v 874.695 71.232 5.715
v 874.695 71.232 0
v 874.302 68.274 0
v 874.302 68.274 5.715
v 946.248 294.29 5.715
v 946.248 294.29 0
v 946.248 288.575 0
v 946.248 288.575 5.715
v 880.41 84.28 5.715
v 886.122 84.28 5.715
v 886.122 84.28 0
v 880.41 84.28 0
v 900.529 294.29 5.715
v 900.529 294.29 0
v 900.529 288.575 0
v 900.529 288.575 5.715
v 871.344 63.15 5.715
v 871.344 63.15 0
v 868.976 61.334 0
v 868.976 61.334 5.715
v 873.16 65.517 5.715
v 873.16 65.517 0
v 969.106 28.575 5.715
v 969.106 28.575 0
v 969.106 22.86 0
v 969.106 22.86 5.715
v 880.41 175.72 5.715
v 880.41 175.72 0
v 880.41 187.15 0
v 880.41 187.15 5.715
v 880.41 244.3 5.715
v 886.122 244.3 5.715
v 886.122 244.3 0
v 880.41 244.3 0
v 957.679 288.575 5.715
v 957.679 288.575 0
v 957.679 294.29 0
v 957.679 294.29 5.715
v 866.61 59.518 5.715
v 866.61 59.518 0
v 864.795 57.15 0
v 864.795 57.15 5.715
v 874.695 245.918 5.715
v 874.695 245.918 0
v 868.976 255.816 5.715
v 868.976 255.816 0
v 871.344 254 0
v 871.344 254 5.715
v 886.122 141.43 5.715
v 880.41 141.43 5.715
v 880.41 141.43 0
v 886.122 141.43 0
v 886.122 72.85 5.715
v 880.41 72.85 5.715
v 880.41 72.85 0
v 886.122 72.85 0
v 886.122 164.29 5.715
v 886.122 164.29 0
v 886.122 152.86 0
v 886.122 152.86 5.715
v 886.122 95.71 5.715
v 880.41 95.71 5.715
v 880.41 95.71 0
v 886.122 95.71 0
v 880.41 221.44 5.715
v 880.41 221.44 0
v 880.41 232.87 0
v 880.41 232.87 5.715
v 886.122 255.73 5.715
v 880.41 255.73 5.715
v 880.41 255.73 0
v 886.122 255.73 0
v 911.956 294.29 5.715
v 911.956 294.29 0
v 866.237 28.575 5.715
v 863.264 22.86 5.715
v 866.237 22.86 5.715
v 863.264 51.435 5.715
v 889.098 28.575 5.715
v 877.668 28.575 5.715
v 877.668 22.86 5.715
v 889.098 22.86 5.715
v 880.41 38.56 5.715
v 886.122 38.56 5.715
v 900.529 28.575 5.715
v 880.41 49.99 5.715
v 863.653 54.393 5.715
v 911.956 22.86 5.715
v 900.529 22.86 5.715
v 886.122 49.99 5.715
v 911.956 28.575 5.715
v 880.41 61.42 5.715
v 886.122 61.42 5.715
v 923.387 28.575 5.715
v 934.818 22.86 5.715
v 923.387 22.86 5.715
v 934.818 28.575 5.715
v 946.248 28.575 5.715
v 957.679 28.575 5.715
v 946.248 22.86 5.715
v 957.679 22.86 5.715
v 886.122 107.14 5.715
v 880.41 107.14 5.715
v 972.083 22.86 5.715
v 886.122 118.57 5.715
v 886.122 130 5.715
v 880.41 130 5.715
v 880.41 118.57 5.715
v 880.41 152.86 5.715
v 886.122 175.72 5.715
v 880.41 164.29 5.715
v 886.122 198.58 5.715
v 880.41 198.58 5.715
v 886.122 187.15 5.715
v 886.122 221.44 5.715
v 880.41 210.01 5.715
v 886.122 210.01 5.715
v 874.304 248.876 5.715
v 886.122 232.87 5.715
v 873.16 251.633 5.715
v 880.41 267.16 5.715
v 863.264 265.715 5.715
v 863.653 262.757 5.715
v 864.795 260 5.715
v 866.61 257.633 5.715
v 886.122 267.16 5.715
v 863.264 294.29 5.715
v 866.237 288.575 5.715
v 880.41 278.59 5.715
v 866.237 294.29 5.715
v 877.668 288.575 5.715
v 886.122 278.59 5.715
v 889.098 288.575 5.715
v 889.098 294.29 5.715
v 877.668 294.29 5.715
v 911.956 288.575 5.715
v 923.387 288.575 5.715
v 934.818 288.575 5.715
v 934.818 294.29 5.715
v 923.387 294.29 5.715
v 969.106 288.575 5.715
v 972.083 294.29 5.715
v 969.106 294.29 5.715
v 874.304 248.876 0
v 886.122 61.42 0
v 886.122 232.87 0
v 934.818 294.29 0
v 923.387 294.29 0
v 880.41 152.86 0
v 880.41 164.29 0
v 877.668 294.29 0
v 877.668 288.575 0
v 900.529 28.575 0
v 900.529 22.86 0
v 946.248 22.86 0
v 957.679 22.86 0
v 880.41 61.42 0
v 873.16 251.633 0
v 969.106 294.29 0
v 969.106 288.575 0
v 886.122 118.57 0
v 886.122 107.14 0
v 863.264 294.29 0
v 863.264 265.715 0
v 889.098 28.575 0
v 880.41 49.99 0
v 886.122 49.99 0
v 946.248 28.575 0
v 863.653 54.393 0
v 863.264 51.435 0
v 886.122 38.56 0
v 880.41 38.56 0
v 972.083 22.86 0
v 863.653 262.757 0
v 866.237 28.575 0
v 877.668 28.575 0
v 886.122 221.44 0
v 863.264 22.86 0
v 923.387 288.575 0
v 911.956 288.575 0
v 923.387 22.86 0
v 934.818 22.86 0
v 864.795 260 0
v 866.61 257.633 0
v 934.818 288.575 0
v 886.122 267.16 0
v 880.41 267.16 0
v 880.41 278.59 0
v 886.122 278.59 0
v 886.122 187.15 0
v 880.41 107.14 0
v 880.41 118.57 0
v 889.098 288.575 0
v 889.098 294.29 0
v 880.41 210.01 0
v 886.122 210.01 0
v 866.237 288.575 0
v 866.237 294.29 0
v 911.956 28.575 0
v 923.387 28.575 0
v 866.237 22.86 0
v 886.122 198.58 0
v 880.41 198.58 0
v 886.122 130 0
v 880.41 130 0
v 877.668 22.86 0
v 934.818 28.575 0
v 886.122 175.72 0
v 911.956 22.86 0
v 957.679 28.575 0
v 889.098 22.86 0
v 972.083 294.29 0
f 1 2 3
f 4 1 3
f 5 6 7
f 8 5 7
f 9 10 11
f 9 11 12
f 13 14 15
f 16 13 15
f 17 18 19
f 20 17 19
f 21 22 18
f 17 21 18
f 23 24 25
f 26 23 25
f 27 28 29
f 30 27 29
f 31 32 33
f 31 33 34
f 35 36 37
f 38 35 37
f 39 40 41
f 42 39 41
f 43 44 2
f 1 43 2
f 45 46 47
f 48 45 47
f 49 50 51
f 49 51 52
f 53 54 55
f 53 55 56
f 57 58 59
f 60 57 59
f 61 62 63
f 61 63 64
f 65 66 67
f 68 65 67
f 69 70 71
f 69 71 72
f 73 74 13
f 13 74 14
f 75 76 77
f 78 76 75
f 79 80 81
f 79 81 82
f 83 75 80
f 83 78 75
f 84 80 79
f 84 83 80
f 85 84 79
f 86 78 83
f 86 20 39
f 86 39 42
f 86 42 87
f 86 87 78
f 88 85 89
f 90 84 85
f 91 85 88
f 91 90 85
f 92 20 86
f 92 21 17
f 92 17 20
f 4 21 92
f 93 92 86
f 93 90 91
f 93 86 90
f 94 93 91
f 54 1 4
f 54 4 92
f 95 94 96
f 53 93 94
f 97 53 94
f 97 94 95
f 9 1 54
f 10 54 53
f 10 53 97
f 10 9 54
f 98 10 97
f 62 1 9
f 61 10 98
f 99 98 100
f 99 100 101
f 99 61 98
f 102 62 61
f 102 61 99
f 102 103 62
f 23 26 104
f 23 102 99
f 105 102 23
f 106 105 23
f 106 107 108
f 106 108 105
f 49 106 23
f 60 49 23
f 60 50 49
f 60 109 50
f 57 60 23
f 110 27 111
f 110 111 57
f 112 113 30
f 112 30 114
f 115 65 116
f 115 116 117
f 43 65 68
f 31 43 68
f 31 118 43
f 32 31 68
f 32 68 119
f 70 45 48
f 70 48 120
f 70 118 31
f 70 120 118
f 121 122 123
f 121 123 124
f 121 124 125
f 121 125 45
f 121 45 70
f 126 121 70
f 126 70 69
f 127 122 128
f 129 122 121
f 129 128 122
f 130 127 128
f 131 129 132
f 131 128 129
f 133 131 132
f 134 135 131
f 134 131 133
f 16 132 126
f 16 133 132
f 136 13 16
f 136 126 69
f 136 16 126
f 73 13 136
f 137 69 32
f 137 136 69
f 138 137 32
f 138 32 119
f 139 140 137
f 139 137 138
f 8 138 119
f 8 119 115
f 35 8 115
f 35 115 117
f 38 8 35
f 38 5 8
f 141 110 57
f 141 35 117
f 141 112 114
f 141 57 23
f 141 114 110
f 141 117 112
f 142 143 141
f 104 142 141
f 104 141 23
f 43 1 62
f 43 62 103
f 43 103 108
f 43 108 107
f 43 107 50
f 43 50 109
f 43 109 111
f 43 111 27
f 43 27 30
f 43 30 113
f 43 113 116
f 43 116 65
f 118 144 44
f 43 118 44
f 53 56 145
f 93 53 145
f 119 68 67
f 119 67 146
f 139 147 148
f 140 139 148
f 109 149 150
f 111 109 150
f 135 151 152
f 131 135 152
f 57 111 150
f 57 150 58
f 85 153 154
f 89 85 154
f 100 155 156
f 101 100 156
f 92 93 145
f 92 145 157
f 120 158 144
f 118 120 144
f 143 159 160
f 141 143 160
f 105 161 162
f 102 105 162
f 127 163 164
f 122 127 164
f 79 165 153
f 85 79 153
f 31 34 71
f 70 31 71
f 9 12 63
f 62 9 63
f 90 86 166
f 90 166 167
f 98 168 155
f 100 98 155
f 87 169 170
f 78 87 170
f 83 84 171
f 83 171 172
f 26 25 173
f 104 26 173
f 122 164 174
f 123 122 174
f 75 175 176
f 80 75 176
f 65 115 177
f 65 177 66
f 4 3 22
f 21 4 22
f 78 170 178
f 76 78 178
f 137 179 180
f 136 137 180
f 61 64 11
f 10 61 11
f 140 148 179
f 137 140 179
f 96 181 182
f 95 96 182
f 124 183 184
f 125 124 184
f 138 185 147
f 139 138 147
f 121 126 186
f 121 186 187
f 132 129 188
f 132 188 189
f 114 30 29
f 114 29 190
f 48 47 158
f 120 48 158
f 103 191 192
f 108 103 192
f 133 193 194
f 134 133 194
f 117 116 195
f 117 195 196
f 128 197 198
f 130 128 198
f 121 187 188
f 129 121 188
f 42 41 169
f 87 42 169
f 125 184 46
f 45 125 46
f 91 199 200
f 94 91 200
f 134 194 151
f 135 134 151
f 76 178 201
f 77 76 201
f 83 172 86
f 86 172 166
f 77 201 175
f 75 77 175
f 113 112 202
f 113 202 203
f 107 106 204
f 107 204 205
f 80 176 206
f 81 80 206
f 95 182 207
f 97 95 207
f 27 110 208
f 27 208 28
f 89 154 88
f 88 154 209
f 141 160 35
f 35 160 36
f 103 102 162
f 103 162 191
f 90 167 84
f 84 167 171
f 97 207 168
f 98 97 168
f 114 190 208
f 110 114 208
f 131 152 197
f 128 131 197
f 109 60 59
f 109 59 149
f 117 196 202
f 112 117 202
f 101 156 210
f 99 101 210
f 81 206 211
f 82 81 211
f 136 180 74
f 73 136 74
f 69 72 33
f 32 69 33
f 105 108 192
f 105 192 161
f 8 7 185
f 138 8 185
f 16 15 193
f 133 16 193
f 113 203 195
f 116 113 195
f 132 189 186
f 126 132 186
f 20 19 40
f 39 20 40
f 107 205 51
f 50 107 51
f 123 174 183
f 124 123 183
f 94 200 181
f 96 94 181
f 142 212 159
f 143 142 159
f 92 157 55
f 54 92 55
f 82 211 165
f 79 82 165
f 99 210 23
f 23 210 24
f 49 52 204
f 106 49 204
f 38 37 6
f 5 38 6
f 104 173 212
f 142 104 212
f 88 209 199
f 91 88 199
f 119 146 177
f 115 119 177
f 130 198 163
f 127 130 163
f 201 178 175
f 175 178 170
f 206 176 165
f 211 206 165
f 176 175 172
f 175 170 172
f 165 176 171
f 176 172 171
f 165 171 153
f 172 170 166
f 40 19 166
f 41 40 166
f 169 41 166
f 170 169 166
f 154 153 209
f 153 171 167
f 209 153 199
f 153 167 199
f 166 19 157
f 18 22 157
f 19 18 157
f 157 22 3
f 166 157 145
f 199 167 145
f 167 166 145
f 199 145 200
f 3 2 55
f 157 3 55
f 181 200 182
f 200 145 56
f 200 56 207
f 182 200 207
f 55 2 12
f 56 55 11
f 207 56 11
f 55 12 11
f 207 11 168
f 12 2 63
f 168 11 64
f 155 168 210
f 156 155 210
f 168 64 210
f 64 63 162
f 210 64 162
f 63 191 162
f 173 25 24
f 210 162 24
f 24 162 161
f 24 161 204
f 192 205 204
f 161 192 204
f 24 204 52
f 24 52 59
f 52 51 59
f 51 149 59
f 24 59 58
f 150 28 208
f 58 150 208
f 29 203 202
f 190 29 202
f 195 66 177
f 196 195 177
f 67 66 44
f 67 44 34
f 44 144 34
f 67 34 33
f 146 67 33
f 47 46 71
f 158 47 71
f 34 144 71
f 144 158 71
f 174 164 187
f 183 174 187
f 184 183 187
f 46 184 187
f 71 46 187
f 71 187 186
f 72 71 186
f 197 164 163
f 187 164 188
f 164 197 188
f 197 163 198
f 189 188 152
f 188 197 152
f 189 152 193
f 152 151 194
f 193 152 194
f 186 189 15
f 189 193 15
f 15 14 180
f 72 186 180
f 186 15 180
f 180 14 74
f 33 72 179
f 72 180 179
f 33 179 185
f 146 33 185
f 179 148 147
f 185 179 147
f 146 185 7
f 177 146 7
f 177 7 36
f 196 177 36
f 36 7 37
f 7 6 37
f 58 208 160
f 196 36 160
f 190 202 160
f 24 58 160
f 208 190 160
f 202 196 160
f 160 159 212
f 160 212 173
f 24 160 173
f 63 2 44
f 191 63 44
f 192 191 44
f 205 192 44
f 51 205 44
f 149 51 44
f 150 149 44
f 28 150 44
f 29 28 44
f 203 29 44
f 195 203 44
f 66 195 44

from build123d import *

# Parameters (mm, degrees)
BOSS_EXTRUDE1_DEPTH = 5.715


with BuildPart() as part:
    # Model → Boss-Extrude1 (new body)
    with BuildSketch(Plane.XY):
        Polygon((863.263977742, 22.860238699), (866.236815782, 22.860238699), (866.236815782, 28.575245224), (877.667537494, 28.575245224), (877.667537494, 22.860238699), (889.098259207, 22.860238699), (889.098259207, 28.575245224), (900.528980919, 28.575245224), (900.528980919, 22.860238699), (911.95615932, 22.860238699), (911.95615932, 28.575245224), (923.386881032, 28.575245224), (923.386881032, 22.860238699), (934.817602745, 22.860238699), (934.817602745, 28.575245224), (946.248324457, 28.575245224), (946.248324457, 22.860238699), (957.679046169, 22.860238699), (957.679046169, 28.575245224), (969.10622457, 28.575245224), (969.10622457, 22.860238699), (972.082605921, 22.860238699), (972.082605921, 28.575245224), (972.082605921, 288.575408216), (972.082605921, 294.290414741), (969.10622457, 294.290414741), (969.10622457, 288.575408216), (957.679046169, 288.575408216), (957.679046169, 294.290414741), (946.248324457, 294.290414741), (946.248324457, 288.575408216), (934.817602745, 288.575408216), (934.817602745, 294.290414741), (923.386881032, 294.290414741), (923.386881032, 288.575408216), (911.95615932, 288.575408216), (911.95615932, 294.290414741), (900.528980919, 294.290414741), (900.528980919, 288.575408216), (889.098259207, 288.575408216), (889.098259207, 294.290414741), (877.667537494, 294.290414741), (877.667537494, 288.575408216), (866.236815782, 288.575408216), (866.236815782, 294.290414741), (863.263977742, 294.290414741), (863.263977742, 288.575408216), (863.263977742, 265.715382116), (863.653299053, 262.757291337), (864.794688151, 260.000375591), (866.610192193, 257.633089424), (868.975795287, 255.816433806), (871.344498779, 254.00013252), (873.160445734, 251.633200684), (874.303606488, 248.876284937), (874.694699455, 245.918194159), (874.694699455, 71.232246682), (874.302277747, 68.274290549), (873.160445734, 65.517240157), (871.344498779, 63.150485487), (868.975795287, 61.334361366), (866.610192193, 59.517571103), (864.794688151, 57.150419581), (863.653299053, 54.393369189), (863.263977742, 51.435413056), (863.263977742, 28.575245224), align=None)
        Polygon((880.410060311, 272.875350921), (880.410060311, 278.590357446), (886.121877856, 278.590357446), (886.121877856, 267.160344396), (880.410060311, 267.160344396), align=None, mode=Mode.SUBTRACT)
        Polygon((880.410060311, 250.015324821), (880.410060311, 255.730331346), (886.121877856, 255.730331346), (886.121877856, 244.300318296), (880.410060311, 244.300318296), align=None, mode=Mode.SUBTRACT)
        Polygon((880.410060311, 227.155298721), (880.410060311, 232.870305246), (886.121877856, 232.870305246), (886.121877856, 221.440292196), (880.410060311, 221.440292196), align=None, mode=Mode.SUBTRACT)
        Polygon((880.410060311, 204.295272621), (880.410060311, 210.010279146), (886.121877856, 210.010279146), (886.121877856, 198.580266096), (880.410060311, 198.580266096), align=None, mode=Mode.SUBTRACT)
        Polygon((880.410060311, 181.435246521), (880.410060311, 187.150253046), (886.121877856, 187.150253046), (886.121877856, 175.720239996), (880.410060311, 175.720239996), align=None, mode=Mode.SUBTRACT)
        Polygon((880.410060311, 158.575220421), (880.410060311, 164.290226946), (886.121877856, 164.290226946), (886.121877856, 152.860213896), (880.410060311, 152.860213896), align=None, mode=Mode.SUBTRACT)
        Polygon((880.410060311, 135.71519432), (880.410060311, 141.430200846), (886.121877856, 141.430200846), (886.121877856, 130.000187795), (880.410060311, 130.000187795), align=None, mode=Mode.SUBTRACT)
        Polygon((880.410060311, 112.85516822), (880.410060311, 118.570174745), (886.121877856, 118.570174745), (886.121877856, 107.140161695), (880.410060311, 107.140161695), align=None, mode=Mode.SUBTRACT)
        Polygon((880.410060311, 89.99514212), (880.410060311, 95.710148645), (886.121877856, 95.710148645), (886.121877856, 84.280135595), (880.410060311, 84.280135595), align=None, mode=Mode.SUBTRACT)
        Polygon((880.410060311, 67.13511602), (880.410060311, 72.850122545), (886.121877856, 72.850122545), (886.121877856, 61.420109495), (880.410060311, 61.420109495), align=None, mode=Mode.SUBTRACT)
        Polygon((880.410060311, 44.27508992), (880.410060311, 49.990096445), (886.121877856, 49.990096445), (886.121877856, 38.560083395), (880.410060311, 38.560083395), align=None, mode=Mode.SUBTRACT)
    extrude(amount=BOSS_EXTRUDE1_DEPTH)


solid = part.part
